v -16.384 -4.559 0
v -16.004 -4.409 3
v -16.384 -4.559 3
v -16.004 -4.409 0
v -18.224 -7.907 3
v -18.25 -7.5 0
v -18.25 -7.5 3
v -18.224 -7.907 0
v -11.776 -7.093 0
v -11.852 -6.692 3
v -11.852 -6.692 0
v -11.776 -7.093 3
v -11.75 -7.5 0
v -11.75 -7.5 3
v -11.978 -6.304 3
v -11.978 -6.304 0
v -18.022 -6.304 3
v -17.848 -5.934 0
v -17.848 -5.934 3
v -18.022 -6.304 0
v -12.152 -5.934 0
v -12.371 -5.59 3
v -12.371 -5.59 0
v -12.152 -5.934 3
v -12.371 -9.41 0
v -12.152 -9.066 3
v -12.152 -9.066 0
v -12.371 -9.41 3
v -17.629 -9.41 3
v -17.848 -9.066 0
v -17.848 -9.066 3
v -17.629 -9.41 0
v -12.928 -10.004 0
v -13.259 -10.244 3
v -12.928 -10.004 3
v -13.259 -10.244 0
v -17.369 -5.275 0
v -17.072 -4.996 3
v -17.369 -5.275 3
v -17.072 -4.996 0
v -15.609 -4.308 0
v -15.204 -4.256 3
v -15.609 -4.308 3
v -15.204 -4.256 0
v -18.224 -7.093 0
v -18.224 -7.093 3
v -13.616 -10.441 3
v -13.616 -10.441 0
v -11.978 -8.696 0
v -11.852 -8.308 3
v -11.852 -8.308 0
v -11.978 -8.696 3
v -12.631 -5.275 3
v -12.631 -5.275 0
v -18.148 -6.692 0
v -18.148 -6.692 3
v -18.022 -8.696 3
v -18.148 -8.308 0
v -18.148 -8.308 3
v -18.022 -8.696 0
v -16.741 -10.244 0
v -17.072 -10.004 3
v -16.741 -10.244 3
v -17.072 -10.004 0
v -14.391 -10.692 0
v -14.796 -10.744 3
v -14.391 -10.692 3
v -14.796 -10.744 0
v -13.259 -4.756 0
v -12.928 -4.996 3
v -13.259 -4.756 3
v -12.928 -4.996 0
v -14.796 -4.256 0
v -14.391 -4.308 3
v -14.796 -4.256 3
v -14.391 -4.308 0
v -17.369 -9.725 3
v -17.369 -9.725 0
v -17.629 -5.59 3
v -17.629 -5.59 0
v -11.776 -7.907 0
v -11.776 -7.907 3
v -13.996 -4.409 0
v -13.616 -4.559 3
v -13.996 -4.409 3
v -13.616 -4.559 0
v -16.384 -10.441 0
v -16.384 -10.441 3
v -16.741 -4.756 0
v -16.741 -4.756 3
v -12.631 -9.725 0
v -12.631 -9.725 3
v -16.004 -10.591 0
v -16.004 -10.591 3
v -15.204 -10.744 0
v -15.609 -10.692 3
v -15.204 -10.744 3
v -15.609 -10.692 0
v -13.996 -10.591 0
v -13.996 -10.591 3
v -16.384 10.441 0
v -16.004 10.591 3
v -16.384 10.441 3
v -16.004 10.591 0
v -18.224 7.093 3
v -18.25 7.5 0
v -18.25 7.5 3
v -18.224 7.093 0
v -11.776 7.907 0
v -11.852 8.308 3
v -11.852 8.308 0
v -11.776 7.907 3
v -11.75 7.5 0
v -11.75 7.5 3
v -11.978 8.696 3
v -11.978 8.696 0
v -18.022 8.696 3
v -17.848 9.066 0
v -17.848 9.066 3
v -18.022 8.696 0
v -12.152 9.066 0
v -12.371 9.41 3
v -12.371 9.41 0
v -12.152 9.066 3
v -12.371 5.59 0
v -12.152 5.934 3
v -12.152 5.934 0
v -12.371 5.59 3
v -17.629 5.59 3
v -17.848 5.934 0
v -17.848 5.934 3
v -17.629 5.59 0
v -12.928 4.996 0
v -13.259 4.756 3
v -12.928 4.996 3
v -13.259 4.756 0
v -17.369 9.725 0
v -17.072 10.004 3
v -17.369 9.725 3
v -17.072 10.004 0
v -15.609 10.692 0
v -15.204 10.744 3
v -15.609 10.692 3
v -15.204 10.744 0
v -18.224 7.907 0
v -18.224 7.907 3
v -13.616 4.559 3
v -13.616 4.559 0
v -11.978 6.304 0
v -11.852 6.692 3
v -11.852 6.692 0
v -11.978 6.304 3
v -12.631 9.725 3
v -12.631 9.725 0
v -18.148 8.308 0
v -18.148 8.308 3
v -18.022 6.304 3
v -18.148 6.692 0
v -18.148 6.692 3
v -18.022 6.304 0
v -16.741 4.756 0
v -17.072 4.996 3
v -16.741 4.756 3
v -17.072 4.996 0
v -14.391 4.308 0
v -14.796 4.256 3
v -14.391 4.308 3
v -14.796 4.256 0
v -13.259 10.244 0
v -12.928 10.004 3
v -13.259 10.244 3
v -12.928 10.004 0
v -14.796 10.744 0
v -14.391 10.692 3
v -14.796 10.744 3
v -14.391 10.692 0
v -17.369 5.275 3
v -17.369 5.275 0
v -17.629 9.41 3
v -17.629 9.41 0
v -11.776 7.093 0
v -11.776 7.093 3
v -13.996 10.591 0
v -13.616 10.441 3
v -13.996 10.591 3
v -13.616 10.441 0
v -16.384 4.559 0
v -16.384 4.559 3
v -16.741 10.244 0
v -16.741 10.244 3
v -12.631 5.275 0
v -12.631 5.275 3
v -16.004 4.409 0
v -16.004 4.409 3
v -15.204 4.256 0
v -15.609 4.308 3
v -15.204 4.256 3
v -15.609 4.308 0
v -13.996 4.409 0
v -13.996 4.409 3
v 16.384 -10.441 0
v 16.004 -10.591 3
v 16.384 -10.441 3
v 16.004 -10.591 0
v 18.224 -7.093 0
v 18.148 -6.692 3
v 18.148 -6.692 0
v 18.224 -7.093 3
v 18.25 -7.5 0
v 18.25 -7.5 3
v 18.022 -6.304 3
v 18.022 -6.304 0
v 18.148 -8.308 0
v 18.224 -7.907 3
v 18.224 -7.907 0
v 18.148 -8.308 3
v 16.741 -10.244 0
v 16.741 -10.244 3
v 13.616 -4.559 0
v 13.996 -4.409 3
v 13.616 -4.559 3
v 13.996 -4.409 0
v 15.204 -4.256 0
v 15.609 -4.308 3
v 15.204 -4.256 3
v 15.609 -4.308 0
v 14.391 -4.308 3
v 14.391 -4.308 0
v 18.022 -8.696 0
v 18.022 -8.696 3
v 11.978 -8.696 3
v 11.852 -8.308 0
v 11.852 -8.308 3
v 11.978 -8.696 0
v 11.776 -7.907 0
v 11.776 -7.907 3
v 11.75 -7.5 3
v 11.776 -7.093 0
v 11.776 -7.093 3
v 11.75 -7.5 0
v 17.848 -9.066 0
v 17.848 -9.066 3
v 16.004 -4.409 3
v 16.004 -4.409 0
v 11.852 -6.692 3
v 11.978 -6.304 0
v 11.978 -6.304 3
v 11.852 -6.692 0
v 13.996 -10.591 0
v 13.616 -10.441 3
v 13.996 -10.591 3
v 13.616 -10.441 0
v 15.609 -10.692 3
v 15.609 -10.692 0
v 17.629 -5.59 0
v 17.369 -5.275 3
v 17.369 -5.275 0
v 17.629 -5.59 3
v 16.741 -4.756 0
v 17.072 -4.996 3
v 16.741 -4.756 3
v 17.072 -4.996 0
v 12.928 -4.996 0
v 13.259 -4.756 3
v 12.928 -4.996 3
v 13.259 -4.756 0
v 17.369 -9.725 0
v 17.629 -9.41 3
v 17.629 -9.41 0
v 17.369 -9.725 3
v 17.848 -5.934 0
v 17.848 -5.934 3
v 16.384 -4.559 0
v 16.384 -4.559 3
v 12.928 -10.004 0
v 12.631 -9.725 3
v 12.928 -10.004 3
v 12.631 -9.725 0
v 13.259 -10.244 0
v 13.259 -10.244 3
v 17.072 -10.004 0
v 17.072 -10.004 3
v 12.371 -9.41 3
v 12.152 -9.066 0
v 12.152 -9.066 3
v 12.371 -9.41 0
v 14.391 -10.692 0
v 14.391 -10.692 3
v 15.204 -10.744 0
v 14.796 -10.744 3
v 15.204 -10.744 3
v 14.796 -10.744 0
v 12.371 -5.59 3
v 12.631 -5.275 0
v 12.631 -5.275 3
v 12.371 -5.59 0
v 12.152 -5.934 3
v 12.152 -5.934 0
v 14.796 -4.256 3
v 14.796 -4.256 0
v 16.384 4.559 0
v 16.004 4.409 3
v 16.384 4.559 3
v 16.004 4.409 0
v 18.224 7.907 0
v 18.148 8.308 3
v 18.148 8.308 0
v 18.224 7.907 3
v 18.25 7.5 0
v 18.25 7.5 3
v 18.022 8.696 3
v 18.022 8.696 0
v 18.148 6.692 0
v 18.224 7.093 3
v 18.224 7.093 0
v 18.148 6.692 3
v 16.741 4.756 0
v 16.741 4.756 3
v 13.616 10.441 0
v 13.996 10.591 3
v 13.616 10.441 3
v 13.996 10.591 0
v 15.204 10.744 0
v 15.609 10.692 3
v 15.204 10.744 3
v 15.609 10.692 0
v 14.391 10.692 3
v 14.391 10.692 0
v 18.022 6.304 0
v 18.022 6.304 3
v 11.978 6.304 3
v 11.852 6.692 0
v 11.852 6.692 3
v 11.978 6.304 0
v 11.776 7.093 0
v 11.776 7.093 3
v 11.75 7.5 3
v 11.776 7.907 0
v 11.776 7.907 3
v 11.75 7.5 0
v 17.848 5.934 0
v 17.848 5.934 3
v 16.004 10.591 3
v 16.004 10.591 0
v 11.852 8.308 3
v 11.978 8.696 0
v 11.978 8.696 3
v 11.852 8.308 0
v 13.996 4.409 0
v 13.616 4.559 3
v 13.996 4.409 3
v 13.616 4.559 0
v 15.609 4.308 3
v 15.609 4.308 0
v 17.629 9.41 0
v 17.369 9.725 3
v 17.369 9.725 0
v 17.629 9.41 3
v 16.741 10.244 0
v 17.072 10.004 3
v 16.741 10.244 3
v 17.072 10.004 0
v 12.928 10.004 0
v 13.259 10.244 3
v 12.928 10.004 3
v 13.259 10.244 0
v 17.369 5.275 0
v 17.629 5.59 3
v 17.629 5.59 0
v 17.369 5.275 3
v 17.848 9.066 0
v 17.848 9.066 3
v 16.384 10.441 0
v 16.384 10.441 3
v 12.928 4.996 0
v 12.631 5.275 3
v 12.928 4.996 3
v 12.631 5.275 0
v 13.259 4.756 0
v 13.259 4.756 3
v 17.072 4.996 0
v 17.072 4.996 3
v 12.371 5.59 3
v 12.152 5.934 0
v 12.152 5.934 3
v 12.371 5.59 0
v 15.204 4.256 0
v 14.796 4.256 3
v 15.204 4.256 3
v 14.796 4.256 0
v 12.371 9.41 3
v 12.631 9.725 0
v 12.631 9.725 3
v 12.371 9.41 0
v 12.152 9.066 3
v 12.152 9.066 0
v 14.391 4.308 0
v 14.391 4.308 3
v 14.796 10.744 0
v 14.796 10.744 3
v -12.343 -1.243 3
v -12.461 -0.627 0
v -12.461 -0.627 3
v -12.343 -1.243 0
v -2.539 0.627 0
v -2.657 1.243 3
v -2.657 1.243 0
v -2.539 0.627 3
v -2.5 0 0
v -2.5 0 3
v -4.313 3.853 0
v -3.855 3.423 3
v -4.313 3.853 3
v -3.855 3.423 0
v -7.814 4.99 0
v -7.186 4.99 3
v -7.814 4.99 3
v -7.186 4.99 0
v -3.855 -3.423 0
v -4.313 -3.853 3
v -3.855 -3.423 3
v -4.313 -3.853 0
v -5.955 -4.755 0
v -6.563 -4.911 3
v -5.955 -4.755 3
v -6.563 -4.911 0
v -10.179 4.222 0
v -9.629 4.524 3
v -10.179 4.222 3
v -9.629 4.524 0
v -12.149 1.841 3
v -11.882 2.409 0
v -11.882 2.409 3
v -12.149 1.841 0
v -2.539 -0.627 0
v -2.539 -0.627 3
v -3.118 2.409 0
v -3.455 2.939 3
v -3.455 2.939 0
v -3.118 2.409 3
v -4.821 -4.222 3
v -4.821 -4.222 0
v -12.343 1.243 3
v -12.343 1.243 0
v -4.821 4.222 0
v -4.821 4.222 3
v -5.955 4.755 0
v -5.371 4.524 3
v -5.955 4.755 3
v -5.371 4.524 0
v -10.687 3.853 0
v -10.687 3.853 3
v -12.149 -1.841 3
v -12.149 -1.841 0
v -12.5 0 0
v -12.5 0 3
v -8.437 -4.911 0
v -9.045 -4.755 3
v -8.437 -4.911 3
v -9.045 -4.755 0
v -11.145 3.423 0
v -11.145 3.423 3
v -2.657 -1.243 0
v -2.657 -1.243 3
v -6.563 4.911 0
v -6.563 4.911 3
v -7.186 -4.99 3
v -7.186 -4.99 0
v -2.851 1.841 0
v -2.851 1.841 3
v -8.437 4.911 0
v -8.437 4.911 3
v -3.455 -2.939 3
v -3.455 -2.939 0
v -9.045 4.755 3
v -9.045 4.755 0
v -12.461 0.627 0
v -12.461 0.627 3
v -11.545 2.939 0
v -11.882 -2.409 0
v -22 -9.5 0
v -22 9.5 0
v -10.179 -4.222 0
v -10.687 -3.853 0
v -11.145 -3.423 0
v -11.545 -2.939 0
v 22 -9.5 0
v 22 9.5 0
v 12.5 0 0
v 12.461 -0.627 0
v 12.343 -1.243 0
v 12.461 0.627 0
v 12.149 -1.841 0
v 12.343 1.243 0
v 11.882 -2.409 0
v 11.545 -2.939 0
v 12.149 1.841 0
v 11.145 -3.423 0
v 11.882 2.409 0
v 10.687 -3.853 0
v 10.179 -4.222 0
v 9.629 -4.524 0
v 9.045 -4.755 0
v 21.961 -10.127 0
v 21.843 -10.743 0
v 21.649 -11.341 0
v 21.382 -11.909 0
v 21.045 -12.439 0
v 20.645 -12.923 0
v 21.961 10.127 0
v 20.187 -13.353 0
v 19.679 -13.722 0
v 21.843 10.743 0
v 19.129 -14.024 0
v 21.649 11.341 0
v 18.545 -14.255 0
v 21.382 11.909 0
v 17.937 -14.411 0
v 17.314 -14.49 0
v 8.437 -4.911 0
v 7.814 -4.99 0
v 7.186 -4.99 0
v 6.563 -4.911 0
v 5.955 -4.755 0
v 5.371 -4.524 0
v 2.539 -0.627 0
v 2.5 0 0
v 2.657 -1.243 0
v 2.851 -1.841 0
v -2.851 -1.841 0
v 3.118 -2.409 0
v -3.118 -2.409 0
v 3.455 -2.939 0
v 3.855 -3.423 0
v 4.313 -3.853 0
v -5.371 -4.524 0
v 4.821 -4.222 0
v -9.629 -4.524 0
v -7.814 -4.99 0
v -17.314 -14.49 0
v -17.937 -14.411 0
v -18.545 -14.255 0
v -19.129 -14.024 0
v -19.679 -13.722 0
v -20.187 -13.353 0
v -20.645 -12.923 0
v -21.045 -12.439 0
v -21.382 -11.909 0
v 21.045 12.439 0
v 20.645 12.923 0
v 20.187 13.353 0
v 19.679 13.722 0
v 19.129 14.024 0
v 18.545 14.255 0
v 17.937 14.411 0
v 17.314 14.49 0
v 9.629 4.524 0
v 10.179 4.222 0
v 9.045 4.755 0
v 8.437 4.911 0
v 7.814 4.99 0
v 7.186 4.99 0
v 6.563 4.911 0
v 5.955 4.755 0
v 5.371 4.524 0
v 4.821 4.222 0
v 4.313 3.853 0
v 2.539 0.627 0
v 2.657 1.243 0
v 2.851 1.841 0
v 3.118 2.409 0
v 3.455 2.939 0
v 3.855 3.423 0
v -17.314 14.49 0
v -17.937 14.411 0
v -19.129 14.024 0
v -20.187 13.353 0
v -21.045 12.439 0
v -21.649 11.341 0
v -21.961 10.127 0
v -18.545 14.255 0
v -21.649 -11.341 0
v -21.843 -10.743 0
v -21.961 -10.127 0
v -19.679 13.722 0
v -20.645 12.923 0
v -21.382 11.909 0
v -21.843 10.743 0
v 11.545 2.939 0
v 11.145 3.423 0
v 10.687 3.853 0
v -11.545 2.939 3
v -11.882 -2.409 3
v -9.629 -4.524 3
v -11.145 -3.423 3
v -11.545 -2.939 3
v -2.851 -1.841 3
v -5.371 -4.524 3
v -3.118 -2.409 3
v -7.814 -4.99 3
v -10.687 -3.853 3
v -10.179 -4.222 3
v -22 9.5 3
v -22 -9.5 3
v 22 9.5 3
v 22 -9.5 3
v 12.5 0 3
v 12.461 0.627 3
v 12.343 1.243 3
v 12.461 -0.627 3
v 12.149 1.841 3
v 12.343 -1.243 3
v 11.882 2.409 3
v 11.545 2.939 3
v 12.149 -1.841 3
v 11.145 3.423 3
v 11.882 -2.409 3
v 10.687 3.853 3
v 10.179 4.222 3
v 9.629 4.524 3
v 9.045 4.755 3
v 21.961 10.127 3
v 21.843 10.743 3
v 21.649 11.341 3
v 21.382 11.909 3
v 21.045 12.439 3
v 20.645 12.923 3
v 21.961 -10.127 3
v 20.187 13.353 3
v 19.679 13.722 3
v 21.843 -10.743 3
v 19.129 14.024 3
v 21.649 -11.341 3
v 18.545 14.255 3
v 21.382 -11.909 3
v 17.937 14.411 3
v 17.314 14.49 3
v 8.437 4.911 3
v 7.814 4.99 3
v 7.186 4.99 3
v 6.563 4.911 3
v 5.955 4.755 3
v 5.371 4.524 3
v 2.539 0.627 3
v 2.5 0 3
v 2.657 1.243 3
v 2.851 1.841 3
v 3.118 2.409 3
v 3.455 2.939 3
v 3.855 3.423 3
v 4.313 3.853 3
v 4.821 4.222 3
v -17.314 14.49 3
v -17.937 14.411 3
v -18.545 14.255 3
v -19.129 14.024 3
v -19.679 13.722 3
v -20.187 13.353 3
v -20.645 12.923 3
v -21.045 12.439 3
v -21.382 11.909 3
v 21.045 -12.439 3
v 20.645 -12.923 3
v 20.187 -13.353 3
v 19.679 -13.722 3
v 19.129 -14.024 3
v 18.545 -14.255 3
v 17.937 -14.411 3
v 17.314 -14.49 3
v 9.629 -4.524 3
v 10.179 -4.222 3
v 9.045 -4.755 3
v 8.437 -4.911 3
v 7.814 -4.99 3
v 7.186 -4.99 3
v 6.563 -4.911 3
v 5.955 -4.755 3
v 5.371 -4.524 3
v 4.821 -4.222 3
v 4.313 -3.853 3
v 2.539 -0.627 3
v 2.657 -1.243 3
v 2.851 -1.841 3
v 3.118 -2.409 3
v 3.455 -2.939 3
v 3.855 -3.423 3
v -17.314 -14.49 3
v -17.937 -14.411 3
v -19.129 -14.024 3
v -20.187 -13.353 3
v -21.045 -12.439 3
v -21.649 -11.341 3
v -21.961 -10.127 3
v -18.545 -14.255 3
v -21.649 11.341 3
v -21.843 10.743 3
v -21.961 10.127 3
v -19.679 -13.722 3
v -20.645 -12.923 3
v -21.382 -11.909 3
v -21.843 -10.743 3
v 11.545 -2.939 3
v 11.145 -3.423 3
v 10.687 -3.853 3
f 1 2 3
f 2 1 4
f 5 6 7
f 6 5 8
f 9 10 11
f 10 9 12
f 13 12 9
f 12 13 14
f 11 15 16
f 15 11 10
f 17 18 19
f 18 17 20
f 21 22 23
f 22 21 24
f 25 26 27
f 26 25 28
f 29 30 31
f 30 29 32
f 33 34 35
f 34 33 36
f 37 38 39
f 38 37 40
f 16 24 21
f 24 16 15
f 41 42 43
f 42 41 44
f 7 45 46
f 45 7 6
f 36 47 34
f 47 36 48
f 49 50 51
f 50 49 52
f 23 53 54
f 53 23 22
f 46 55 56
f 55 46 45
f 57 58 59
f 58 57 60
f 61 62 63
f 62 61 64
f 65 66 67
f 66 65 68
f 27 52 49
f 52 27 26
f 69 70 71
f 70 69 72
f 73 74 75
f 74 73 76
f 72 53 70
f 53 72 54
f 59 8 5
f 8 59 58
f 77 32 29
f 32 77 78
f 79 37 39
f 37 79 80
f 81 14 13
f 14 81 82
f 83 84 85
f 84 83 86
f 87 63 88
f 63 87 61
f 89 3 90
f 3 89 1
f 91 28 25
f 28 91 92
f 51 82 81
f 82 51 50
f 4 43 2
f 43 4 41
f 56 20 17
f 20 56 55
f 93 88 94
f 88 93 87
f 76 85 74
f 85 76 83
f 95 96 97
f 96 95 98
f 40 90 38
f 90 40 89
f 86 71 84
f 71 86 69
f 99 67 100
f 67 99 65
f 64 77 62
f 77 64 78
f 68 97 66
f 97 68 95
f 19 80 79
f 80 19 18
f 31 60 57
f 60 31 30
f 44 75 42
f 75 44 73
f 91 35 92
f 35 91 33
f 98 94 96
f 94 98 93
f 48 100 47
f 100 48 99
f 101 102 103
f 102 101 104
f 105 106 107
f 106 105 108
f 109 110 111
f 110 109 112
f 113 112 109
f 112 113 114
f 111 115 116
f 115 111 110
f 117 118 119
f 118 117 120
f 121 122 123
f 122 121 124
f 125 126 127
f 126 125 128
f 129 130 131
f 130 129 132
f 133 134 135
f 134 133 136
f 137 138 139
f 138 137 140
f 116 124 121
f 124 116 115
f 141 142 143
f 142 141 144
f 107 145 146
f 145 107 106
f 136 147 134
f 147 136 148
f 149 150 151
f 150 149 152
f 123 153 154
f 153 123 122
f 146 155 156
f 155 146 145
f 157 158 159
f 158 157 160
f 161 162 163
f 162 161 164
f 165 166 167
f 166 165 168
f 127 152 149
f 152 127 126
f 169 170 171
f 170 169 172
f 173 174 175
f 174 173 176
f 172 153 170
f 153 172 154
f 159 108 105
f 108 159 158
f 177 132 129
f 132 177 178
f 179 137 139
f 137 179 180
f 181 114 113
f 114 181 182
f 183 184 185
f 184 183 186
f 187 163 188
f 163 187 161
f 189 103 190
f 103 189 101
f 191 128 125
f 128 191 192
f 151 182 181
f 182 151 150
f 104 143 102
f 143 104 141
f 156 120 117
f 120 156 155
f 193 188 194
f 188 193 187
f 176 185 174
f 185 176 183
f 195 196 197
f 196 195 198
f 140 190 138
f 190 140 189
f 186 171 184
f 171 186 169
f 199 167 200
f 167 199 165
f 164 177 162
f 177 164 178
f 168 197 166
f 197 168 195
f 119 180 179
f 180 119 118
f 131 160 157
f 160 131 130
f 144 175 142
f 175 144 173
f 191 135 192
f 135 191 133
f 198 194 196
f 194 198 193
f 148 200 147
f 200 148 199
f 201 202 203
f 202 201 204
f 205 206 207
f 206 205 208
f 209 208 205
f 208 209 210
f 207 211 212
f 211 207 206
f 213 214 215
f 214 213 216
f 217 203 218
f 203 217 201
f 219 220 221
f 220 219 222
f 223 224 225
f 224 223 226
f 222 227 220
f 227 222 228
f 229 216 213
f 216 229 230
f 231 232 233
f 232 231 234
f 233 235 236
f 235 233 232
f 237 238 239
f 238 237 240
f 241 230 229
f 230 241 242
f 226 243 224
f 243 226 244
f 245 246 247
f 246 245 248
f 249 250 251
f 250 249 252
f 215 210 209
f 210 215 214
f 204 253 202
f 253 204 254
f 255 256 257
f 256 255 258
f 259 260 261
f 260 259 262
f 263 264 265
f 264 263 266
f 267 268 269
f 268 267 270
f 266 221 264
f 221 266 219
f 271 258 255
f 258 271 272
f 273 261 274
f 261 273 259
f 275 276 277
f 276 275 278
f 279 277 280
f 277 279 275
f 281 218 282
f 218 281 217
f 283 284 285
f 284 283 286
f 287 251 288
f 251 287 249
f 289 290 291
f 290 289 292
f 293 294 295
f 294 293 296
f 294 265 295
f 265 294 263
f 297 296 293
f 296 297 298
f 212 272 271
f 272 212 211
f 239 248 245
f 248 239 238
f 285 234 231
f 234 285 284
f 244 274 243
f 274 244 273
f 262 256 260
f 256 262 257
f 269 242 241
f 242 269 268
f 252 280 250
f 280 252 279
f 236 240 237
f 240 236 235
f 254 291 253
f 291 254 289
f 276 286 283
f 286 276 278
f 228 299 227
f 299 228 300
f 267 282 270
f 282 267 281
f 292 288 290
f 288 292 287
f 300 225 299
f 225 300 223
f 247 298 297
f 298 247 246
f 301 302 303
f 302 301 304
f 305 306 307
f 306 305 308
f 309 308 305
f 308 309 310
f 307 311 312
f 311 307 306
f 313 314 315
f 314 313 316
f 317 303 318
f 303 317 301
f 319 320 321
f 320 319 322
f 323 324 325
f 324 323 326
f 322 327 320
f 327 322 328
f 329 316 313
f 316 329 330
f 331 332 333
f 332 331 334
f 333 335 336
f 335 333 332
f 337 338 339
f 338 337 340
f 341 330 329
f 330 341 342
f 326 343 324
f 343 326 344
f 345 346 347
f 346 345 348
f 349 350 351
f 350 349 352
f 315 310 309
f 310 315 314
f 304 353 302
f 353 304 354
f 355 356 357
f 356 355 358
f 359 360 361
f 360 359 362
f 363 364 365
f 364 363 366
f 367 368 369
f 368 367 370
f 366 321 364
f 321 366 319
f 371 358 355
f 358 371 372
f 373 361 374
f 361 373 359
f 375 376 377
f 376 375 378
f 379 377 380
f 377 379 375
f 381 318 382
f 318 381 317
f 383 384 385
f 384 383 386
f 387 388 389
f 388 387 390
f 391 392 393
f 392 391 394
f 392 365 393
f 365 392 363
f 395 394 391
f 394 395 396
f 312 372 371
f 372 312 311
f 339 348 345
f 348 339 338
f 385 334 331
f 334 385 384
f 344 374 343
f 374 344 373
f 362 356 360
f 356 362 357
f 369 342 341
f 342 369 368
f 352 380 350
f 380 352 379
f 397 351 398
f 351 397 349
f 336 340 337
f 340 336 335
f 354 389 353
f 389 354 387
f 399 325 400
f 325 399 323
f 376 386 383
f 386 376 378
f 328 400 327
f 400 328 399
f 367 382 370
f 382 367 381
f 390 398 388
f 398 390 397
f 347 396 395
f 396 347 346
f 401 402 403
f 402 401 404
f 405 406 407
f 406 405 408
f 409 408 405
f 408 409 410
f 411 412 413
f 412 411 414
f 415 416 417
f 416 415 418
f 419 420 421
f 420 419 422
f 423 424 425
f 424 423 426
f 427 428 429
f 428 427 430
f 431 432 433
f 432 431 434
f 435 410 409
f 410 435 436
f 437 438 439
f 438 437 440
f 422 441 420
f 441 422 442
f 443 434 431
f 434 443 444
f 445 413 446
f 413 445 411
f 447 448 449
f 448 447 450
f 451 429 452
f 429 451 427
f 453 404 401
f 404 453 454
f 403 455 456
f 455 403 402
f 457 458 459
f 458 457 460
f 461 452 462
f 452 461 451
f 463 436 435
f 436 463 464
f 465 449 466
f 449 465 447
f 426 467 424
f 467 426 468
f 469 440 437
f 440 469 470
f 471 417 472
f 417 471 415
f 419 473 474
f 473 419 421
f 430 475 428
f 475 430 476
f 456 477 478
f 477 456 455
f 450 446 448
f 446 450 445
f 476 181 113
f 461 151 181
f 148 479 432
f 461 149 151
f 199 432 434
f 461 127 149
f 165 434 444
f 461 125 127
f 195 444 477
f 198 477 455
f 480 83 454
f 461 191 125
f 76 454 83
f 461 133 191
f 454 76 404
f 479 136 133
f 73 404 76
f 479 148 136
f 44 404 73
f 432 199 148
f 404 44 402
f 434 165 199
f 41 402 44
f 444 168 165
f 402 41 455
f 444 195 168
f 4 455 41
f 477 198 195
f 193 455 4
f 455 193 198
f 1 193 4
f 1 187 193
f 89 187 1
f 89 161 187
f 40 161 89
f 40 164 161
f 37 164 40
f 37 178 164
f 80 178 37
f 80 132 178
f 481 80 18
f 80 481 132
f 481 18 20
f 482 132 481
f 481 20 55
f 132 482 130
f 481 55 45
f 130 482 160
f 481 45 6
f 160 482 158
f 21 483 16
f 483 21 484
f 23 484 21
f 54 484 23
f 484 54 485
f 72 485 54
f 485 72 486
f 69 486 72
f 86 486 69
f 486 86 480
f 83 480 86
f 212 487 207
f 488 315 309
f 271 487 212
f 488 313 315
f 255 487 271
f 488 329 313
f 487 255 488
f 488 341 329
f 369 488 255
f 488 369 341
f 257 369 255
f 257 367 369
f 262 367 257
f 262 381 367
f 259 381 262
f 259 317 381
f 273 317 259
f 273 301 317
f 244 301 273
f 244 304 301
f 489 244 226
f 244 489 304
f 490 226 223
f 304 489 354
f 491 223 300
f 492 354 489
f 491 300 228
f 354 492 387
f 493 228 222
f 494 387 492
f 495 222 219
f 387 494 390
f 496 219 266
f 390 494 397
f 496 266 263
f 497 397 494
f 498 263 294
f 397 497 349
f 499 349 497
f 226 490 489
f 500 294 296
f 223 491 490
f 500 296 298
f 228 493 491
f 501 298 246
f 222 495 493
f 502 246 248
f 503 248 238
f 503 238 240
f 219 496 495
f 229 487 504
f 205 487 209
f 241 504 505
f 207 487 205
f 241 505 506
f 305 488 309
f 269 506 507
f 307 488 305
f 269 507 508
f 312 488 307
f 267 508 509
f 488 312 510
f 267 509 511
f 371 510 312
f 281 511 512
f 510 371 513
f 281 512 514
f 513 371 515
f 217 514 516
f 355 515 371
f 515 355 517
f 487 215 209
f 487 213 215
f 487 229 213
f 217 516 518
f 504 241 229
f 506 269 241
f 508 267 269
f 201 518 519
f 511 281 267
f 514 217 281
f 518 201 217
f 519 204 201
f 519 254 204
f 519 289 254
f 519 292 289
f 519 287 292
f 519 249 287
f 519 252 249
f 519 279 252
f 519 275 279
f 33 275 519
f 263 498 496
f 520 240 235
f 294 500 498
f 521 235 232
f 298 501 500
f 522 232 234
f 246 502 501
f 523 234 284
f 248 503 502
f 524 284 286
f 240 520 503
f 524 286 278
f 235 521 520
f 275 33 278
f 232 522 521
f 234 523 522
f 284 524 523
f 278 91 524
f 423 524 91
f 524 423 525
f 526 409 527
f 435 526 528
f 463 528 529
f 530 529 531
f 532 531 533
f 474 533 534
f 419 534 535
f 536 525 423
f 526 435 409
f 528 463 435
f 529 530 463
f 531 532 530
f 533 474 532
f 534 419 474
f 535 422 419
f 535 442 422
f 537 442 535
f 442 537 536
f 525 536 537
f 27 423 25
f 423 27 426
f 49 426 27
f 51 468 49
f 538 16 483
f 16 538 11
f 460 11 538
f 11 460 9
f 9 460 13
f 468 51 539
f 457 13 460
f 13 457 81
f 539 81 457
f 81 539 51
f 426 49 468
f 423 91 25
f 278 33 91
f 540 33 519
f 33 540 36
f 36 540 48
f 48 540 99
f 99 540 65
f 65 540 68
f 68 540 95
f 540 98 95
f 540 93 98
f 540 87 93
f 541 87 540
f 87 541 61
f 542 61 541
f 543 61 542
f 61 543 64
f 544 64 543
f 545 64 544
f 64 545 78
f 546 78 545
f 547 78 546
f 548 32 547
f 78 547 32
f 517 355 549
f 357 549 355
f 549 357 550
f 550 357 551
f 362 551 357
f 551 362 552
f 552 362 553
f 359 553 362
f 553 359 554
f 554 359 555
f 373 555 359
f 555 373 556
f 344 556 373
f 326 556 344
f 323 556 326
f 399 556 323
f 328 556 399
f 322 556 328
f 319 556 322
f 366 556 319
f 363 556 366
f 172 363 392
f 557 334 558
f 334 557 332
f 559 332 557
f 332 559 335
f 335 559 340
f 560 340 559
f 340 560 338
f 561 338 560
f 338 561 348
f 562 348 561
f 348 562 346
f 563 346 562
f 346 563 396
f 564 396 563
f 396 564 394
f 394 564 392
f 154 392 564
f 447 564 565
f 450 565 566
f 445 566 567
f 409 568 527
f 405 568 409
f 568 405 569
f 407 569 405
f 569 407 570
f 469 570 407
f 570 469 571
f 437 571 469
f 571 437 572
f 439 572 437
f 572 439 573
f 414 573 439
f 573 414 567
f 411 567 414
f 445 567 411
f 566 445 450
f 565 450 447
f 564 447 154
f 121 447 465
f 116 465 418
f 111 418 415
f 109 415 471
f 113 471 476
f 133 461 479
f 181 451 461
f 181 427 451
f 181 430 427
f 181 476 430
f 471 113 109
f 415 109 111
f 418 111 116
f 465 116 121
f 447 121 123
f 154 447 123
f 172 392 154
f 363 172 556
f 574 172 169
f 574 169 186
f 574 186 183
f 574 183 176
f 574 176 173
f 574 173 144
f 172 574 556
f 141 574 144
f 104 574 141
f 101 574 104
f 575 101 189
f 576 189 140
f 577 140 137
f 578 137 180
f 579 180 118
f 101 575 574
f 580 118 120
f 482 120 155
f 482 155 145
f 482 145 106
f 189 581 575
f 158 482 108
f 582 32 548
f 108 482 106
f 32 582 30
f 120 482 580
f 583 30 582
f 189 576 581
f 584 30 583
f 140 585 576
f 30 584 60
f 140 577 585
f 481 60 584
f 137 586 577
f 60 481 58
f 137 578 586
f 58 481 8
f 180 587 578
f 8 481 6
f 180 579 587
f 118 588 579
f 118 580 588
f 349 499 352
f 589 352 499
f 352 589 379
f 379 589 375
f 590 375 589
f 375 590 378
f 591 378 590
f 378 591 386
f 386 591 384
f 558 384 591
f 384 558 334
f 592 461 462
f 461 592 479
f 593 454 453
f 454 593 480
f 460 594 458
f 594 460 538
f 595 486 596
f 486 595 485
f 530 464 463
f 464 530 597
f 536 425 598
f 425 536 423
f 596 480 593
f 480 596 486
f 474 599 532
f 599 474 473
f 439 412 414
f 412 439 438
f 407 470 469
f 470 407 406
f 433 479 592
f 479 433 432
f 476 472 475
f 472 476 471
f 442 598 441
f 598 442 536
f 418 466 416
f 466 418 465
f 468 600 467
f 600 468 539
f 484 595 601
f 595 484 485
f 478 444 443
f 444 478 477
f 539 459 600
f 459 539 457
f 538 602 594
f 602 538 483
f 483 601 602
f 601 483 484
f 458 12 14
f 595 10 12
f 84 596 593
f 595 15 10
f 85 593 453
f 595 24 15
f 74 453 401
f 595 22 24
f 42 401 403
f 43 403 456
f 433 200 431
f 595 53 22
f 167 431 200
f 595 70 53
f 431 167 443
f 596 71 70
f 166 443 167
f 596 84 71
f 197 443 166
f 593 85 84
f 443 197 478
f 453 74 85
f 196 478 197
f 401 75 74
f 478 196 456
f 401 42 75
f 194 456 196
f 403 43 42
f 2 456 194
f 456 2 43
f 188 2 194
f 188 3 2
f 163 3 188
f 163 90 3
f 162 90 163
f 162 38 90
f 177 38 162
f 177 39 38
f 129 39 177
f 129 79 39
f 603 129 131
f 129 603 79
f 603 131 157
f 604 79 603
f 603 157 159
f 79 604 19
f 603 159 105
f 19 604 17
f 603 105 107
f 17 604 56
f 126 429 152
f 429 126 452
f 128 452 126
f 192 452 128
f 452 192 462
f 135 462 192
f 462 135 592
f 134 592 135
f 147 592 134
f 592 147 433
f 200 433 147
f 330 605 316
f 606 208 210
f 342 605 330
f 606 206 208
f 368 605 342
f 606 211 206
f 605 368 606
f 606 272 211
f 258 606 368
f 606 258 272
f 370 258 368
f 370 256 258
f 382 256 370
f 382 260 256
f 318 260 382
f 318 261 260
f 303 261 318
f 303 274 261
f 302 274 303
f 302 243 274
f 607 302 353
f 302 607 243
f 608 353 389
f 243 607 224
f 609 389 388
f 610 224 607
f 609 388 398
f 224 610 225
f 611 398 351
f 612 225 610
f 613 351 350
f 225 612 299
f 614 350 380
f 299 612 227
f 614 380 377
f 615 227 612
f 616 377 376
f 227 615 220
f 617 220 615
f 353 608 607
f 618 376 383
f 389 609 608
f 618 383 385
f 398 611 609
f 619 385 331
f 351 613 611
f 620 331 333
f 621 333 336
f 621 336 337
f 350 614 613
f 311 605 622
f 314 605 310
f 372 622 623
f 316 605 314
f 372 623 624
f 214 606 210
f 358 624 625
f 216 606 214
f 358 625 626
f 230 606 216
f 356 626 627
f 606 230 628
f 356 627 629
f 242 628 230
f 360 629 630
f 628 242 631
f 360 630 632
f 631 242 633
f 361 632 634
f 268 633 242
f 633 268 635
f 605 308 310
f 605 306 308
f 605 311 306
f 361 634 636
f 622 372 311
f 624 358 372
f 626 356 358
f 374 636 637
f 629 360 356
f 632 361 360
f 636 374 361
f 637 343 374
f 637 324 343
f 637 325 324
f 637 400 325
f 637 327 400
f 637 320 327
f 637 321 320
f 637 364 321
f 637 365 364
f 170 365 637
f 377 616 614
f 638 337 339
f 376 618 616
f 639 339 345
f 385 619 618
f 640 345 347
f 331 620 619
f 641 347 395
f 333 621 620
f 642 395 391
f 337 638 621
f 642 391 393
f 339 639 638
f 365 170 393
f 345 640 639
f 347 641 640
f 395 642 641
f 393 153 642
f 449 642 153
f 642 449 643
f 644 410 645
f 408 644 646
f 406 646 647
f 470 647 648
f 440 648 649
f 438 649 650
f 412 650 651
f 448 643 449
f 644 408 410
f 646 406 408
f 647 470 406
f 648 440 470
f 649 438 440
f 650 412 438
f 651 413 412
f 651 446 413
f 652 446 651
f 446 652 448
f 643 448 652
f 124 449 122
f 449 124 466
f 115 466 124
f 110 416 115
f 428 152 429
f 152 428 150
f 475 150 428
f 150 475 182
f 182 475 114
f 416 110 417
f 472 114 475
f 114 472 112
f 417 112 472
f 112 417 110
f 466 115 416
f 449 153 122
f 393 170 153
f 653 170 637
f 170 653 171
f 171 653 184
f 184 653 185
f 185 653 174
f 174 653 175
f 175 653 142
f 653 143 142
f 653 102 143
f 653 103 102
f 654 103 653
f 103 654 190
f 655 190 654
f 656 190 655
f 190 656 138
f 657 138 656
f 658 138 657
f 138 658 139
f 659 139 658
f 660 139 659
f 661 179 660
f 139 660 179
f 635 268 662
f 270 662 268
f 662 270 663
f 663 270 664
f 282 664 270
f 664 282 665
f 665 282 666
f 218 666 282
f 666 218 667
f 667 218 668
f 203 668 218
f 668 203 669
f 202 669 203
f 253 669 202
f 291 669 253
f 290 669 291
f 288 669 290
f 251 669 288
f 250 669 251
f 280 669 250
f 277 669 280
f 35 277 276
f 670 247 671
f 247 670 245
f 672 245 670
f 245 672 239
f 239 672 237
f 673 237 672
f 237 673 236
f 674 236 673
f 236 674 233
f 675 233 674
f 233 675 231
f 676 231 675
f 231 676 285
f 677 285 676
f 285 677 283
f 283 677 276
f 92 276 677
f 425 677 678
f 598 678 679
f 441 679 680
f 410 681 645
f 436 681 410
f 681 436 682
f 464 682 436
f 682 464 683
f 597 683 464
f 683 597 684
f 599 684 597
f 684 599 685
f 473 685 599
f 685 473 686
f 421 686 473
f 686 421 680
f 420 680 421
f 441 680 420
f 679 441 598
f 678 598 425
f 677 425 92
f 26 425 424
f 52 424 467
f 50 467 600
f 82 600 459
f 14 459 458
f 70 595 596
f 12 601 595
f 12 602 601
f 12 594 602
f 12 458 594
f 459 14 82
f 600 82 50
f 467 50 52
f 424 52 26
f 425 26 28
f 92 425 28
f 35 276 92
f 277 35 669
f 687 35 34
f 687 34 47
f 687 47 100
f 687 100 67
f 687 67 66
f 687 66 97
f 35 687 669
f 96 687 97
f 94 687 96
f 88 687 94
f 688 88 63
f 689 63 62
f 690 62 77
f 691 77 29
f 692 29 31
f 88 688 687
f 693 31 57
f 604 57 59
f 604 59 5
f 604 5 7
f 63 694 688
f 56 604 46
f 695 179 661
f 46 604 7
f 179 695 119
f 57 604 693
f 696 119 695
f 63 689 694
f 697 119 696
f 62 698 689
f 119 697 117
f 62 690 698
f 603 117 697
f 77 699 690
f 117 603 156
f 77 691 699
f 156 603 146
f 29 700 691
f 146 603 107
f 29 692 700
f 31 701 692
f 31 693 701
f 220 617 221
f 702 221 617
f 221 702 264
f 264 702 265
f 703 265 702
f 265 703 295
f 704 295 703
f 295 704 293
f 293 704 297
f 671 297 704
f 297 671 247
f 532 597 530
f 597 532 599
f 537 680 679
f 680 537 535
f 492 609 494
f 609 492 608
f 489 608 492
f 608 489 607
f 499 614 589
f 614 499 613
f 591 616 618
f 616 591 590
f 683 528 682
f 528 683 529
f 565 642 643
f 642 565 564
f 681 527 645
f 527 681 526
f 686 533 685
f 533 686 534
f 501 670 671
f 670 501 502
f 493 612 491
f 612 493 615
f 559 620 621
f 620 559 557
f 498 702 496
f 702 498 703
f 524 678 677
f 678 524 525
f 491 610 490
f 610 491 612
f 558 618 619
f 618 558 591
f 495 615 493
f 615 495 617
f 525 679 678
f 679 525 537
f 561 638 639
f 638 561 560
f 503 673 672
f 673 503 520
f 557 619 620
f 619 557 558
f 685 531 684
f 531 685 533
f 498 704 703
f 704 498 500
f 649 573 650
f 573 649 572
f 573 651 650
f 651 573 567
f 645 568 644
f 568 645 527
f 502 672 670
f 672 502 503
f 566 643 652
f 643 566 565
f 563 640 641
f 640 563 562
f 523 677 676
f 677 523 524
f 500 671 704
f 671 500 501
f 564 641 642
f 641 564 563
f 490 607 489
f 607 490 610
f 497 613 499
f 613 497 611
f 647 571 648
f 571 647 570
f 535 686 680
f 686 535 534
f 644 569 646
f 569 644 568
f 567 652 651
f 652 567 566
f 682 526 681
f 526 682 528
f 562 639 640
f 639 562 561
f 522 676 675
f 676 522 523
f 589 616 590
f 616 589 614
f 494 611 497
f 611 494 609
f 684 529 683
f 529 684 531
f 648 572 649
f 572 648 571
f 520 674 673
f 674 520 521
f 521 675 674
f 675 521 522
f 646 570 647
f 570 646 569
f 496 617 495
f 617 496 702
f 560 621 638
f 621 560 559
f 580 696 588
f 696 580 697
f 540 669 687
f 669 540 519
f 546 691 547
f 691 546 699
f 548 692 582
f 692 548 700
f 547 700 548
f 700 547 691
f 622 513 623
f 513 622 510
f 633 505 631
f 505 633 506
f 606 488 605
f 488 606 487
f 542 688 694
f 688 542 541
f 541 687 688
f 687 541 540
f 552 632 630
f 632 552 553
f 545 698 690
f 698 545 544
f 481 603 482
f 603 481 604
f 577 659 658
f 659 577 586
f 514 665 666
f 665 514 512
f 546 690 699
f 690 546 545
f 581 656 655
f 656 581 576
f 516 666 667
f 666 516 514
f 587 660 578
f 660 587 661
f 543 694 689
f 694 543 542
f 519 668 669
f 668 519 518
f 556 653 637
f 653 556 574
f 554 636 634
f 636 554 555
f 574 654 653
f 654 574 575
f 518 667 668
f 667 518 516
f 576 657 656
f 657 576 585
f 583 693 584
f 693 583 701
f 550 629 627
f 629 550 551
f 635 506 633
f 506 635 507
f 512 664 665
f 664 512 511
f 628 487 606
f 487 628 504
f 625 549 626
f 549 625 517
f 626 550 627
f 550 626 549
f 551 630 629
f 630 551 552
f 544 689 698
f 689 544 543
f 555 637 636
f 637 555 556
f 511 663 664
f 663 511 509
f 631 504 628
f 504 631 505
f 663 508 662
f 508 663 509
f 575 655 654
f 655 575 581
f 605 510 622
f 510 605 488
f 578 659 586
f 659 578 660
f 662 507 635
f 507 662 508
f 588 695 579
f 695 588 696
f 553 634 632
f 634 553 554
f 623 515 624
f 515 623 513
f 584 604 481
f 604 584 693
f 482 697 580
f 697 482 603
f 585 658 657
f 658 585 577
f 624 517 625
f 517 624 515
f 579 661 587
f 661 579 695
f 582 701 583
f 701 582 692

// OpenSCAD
$fn = 50;


difference() {
	union() {
		hull() {
			translate(v = [-17.0000000000, 9.5000000000, 0]) {
				cylinder(h = 3, r = 5);
			}
			translate(v = [17.0000000000, 9.5000000000, 0]) {
				cylinder(h = 3, r = 5);
			}
			translate(v = [-17.0000000000, -9.5000000000, 0]) {
				cylinder(h = 3, r = 5);
			}
			translate(v = [17.0000000000, -9.5000000000, 0]) {
				cylinder(h = 3, r = 5);
			}
		}
	}
	union() {
		#translate(v = [-15.0000000000, -7.5000000000, -100.0000000000]) {
			cylinder(h = 200, r = 3.2500000000);
		}
		#translate(v = [-15.0000000000, 7.5000000000, -100.0000000000]) {
			cylinder(h = 200, r = 3.2500000000);
		}
		#translate(v = [15.0000000000, -7.5000000000, -100.0000000000]) {
			cylinder(h = 200, r = 3.2500000000);
		}
		#translate(v = [15.0000000000, 7.5000000000, -100.0000000000]) {
			cylinder(h = 200, r = 3.2500000000);
		}
		#translate(v = [-7.5000000000, 0, 0]) {
			cylinder(h = 3, r = 5.0000000000);
		}
		#translate(v = [7.5000000000, 0, 0]) {
			cylinder(h = 3, r = 5.0000000000);
		}
	}
}
